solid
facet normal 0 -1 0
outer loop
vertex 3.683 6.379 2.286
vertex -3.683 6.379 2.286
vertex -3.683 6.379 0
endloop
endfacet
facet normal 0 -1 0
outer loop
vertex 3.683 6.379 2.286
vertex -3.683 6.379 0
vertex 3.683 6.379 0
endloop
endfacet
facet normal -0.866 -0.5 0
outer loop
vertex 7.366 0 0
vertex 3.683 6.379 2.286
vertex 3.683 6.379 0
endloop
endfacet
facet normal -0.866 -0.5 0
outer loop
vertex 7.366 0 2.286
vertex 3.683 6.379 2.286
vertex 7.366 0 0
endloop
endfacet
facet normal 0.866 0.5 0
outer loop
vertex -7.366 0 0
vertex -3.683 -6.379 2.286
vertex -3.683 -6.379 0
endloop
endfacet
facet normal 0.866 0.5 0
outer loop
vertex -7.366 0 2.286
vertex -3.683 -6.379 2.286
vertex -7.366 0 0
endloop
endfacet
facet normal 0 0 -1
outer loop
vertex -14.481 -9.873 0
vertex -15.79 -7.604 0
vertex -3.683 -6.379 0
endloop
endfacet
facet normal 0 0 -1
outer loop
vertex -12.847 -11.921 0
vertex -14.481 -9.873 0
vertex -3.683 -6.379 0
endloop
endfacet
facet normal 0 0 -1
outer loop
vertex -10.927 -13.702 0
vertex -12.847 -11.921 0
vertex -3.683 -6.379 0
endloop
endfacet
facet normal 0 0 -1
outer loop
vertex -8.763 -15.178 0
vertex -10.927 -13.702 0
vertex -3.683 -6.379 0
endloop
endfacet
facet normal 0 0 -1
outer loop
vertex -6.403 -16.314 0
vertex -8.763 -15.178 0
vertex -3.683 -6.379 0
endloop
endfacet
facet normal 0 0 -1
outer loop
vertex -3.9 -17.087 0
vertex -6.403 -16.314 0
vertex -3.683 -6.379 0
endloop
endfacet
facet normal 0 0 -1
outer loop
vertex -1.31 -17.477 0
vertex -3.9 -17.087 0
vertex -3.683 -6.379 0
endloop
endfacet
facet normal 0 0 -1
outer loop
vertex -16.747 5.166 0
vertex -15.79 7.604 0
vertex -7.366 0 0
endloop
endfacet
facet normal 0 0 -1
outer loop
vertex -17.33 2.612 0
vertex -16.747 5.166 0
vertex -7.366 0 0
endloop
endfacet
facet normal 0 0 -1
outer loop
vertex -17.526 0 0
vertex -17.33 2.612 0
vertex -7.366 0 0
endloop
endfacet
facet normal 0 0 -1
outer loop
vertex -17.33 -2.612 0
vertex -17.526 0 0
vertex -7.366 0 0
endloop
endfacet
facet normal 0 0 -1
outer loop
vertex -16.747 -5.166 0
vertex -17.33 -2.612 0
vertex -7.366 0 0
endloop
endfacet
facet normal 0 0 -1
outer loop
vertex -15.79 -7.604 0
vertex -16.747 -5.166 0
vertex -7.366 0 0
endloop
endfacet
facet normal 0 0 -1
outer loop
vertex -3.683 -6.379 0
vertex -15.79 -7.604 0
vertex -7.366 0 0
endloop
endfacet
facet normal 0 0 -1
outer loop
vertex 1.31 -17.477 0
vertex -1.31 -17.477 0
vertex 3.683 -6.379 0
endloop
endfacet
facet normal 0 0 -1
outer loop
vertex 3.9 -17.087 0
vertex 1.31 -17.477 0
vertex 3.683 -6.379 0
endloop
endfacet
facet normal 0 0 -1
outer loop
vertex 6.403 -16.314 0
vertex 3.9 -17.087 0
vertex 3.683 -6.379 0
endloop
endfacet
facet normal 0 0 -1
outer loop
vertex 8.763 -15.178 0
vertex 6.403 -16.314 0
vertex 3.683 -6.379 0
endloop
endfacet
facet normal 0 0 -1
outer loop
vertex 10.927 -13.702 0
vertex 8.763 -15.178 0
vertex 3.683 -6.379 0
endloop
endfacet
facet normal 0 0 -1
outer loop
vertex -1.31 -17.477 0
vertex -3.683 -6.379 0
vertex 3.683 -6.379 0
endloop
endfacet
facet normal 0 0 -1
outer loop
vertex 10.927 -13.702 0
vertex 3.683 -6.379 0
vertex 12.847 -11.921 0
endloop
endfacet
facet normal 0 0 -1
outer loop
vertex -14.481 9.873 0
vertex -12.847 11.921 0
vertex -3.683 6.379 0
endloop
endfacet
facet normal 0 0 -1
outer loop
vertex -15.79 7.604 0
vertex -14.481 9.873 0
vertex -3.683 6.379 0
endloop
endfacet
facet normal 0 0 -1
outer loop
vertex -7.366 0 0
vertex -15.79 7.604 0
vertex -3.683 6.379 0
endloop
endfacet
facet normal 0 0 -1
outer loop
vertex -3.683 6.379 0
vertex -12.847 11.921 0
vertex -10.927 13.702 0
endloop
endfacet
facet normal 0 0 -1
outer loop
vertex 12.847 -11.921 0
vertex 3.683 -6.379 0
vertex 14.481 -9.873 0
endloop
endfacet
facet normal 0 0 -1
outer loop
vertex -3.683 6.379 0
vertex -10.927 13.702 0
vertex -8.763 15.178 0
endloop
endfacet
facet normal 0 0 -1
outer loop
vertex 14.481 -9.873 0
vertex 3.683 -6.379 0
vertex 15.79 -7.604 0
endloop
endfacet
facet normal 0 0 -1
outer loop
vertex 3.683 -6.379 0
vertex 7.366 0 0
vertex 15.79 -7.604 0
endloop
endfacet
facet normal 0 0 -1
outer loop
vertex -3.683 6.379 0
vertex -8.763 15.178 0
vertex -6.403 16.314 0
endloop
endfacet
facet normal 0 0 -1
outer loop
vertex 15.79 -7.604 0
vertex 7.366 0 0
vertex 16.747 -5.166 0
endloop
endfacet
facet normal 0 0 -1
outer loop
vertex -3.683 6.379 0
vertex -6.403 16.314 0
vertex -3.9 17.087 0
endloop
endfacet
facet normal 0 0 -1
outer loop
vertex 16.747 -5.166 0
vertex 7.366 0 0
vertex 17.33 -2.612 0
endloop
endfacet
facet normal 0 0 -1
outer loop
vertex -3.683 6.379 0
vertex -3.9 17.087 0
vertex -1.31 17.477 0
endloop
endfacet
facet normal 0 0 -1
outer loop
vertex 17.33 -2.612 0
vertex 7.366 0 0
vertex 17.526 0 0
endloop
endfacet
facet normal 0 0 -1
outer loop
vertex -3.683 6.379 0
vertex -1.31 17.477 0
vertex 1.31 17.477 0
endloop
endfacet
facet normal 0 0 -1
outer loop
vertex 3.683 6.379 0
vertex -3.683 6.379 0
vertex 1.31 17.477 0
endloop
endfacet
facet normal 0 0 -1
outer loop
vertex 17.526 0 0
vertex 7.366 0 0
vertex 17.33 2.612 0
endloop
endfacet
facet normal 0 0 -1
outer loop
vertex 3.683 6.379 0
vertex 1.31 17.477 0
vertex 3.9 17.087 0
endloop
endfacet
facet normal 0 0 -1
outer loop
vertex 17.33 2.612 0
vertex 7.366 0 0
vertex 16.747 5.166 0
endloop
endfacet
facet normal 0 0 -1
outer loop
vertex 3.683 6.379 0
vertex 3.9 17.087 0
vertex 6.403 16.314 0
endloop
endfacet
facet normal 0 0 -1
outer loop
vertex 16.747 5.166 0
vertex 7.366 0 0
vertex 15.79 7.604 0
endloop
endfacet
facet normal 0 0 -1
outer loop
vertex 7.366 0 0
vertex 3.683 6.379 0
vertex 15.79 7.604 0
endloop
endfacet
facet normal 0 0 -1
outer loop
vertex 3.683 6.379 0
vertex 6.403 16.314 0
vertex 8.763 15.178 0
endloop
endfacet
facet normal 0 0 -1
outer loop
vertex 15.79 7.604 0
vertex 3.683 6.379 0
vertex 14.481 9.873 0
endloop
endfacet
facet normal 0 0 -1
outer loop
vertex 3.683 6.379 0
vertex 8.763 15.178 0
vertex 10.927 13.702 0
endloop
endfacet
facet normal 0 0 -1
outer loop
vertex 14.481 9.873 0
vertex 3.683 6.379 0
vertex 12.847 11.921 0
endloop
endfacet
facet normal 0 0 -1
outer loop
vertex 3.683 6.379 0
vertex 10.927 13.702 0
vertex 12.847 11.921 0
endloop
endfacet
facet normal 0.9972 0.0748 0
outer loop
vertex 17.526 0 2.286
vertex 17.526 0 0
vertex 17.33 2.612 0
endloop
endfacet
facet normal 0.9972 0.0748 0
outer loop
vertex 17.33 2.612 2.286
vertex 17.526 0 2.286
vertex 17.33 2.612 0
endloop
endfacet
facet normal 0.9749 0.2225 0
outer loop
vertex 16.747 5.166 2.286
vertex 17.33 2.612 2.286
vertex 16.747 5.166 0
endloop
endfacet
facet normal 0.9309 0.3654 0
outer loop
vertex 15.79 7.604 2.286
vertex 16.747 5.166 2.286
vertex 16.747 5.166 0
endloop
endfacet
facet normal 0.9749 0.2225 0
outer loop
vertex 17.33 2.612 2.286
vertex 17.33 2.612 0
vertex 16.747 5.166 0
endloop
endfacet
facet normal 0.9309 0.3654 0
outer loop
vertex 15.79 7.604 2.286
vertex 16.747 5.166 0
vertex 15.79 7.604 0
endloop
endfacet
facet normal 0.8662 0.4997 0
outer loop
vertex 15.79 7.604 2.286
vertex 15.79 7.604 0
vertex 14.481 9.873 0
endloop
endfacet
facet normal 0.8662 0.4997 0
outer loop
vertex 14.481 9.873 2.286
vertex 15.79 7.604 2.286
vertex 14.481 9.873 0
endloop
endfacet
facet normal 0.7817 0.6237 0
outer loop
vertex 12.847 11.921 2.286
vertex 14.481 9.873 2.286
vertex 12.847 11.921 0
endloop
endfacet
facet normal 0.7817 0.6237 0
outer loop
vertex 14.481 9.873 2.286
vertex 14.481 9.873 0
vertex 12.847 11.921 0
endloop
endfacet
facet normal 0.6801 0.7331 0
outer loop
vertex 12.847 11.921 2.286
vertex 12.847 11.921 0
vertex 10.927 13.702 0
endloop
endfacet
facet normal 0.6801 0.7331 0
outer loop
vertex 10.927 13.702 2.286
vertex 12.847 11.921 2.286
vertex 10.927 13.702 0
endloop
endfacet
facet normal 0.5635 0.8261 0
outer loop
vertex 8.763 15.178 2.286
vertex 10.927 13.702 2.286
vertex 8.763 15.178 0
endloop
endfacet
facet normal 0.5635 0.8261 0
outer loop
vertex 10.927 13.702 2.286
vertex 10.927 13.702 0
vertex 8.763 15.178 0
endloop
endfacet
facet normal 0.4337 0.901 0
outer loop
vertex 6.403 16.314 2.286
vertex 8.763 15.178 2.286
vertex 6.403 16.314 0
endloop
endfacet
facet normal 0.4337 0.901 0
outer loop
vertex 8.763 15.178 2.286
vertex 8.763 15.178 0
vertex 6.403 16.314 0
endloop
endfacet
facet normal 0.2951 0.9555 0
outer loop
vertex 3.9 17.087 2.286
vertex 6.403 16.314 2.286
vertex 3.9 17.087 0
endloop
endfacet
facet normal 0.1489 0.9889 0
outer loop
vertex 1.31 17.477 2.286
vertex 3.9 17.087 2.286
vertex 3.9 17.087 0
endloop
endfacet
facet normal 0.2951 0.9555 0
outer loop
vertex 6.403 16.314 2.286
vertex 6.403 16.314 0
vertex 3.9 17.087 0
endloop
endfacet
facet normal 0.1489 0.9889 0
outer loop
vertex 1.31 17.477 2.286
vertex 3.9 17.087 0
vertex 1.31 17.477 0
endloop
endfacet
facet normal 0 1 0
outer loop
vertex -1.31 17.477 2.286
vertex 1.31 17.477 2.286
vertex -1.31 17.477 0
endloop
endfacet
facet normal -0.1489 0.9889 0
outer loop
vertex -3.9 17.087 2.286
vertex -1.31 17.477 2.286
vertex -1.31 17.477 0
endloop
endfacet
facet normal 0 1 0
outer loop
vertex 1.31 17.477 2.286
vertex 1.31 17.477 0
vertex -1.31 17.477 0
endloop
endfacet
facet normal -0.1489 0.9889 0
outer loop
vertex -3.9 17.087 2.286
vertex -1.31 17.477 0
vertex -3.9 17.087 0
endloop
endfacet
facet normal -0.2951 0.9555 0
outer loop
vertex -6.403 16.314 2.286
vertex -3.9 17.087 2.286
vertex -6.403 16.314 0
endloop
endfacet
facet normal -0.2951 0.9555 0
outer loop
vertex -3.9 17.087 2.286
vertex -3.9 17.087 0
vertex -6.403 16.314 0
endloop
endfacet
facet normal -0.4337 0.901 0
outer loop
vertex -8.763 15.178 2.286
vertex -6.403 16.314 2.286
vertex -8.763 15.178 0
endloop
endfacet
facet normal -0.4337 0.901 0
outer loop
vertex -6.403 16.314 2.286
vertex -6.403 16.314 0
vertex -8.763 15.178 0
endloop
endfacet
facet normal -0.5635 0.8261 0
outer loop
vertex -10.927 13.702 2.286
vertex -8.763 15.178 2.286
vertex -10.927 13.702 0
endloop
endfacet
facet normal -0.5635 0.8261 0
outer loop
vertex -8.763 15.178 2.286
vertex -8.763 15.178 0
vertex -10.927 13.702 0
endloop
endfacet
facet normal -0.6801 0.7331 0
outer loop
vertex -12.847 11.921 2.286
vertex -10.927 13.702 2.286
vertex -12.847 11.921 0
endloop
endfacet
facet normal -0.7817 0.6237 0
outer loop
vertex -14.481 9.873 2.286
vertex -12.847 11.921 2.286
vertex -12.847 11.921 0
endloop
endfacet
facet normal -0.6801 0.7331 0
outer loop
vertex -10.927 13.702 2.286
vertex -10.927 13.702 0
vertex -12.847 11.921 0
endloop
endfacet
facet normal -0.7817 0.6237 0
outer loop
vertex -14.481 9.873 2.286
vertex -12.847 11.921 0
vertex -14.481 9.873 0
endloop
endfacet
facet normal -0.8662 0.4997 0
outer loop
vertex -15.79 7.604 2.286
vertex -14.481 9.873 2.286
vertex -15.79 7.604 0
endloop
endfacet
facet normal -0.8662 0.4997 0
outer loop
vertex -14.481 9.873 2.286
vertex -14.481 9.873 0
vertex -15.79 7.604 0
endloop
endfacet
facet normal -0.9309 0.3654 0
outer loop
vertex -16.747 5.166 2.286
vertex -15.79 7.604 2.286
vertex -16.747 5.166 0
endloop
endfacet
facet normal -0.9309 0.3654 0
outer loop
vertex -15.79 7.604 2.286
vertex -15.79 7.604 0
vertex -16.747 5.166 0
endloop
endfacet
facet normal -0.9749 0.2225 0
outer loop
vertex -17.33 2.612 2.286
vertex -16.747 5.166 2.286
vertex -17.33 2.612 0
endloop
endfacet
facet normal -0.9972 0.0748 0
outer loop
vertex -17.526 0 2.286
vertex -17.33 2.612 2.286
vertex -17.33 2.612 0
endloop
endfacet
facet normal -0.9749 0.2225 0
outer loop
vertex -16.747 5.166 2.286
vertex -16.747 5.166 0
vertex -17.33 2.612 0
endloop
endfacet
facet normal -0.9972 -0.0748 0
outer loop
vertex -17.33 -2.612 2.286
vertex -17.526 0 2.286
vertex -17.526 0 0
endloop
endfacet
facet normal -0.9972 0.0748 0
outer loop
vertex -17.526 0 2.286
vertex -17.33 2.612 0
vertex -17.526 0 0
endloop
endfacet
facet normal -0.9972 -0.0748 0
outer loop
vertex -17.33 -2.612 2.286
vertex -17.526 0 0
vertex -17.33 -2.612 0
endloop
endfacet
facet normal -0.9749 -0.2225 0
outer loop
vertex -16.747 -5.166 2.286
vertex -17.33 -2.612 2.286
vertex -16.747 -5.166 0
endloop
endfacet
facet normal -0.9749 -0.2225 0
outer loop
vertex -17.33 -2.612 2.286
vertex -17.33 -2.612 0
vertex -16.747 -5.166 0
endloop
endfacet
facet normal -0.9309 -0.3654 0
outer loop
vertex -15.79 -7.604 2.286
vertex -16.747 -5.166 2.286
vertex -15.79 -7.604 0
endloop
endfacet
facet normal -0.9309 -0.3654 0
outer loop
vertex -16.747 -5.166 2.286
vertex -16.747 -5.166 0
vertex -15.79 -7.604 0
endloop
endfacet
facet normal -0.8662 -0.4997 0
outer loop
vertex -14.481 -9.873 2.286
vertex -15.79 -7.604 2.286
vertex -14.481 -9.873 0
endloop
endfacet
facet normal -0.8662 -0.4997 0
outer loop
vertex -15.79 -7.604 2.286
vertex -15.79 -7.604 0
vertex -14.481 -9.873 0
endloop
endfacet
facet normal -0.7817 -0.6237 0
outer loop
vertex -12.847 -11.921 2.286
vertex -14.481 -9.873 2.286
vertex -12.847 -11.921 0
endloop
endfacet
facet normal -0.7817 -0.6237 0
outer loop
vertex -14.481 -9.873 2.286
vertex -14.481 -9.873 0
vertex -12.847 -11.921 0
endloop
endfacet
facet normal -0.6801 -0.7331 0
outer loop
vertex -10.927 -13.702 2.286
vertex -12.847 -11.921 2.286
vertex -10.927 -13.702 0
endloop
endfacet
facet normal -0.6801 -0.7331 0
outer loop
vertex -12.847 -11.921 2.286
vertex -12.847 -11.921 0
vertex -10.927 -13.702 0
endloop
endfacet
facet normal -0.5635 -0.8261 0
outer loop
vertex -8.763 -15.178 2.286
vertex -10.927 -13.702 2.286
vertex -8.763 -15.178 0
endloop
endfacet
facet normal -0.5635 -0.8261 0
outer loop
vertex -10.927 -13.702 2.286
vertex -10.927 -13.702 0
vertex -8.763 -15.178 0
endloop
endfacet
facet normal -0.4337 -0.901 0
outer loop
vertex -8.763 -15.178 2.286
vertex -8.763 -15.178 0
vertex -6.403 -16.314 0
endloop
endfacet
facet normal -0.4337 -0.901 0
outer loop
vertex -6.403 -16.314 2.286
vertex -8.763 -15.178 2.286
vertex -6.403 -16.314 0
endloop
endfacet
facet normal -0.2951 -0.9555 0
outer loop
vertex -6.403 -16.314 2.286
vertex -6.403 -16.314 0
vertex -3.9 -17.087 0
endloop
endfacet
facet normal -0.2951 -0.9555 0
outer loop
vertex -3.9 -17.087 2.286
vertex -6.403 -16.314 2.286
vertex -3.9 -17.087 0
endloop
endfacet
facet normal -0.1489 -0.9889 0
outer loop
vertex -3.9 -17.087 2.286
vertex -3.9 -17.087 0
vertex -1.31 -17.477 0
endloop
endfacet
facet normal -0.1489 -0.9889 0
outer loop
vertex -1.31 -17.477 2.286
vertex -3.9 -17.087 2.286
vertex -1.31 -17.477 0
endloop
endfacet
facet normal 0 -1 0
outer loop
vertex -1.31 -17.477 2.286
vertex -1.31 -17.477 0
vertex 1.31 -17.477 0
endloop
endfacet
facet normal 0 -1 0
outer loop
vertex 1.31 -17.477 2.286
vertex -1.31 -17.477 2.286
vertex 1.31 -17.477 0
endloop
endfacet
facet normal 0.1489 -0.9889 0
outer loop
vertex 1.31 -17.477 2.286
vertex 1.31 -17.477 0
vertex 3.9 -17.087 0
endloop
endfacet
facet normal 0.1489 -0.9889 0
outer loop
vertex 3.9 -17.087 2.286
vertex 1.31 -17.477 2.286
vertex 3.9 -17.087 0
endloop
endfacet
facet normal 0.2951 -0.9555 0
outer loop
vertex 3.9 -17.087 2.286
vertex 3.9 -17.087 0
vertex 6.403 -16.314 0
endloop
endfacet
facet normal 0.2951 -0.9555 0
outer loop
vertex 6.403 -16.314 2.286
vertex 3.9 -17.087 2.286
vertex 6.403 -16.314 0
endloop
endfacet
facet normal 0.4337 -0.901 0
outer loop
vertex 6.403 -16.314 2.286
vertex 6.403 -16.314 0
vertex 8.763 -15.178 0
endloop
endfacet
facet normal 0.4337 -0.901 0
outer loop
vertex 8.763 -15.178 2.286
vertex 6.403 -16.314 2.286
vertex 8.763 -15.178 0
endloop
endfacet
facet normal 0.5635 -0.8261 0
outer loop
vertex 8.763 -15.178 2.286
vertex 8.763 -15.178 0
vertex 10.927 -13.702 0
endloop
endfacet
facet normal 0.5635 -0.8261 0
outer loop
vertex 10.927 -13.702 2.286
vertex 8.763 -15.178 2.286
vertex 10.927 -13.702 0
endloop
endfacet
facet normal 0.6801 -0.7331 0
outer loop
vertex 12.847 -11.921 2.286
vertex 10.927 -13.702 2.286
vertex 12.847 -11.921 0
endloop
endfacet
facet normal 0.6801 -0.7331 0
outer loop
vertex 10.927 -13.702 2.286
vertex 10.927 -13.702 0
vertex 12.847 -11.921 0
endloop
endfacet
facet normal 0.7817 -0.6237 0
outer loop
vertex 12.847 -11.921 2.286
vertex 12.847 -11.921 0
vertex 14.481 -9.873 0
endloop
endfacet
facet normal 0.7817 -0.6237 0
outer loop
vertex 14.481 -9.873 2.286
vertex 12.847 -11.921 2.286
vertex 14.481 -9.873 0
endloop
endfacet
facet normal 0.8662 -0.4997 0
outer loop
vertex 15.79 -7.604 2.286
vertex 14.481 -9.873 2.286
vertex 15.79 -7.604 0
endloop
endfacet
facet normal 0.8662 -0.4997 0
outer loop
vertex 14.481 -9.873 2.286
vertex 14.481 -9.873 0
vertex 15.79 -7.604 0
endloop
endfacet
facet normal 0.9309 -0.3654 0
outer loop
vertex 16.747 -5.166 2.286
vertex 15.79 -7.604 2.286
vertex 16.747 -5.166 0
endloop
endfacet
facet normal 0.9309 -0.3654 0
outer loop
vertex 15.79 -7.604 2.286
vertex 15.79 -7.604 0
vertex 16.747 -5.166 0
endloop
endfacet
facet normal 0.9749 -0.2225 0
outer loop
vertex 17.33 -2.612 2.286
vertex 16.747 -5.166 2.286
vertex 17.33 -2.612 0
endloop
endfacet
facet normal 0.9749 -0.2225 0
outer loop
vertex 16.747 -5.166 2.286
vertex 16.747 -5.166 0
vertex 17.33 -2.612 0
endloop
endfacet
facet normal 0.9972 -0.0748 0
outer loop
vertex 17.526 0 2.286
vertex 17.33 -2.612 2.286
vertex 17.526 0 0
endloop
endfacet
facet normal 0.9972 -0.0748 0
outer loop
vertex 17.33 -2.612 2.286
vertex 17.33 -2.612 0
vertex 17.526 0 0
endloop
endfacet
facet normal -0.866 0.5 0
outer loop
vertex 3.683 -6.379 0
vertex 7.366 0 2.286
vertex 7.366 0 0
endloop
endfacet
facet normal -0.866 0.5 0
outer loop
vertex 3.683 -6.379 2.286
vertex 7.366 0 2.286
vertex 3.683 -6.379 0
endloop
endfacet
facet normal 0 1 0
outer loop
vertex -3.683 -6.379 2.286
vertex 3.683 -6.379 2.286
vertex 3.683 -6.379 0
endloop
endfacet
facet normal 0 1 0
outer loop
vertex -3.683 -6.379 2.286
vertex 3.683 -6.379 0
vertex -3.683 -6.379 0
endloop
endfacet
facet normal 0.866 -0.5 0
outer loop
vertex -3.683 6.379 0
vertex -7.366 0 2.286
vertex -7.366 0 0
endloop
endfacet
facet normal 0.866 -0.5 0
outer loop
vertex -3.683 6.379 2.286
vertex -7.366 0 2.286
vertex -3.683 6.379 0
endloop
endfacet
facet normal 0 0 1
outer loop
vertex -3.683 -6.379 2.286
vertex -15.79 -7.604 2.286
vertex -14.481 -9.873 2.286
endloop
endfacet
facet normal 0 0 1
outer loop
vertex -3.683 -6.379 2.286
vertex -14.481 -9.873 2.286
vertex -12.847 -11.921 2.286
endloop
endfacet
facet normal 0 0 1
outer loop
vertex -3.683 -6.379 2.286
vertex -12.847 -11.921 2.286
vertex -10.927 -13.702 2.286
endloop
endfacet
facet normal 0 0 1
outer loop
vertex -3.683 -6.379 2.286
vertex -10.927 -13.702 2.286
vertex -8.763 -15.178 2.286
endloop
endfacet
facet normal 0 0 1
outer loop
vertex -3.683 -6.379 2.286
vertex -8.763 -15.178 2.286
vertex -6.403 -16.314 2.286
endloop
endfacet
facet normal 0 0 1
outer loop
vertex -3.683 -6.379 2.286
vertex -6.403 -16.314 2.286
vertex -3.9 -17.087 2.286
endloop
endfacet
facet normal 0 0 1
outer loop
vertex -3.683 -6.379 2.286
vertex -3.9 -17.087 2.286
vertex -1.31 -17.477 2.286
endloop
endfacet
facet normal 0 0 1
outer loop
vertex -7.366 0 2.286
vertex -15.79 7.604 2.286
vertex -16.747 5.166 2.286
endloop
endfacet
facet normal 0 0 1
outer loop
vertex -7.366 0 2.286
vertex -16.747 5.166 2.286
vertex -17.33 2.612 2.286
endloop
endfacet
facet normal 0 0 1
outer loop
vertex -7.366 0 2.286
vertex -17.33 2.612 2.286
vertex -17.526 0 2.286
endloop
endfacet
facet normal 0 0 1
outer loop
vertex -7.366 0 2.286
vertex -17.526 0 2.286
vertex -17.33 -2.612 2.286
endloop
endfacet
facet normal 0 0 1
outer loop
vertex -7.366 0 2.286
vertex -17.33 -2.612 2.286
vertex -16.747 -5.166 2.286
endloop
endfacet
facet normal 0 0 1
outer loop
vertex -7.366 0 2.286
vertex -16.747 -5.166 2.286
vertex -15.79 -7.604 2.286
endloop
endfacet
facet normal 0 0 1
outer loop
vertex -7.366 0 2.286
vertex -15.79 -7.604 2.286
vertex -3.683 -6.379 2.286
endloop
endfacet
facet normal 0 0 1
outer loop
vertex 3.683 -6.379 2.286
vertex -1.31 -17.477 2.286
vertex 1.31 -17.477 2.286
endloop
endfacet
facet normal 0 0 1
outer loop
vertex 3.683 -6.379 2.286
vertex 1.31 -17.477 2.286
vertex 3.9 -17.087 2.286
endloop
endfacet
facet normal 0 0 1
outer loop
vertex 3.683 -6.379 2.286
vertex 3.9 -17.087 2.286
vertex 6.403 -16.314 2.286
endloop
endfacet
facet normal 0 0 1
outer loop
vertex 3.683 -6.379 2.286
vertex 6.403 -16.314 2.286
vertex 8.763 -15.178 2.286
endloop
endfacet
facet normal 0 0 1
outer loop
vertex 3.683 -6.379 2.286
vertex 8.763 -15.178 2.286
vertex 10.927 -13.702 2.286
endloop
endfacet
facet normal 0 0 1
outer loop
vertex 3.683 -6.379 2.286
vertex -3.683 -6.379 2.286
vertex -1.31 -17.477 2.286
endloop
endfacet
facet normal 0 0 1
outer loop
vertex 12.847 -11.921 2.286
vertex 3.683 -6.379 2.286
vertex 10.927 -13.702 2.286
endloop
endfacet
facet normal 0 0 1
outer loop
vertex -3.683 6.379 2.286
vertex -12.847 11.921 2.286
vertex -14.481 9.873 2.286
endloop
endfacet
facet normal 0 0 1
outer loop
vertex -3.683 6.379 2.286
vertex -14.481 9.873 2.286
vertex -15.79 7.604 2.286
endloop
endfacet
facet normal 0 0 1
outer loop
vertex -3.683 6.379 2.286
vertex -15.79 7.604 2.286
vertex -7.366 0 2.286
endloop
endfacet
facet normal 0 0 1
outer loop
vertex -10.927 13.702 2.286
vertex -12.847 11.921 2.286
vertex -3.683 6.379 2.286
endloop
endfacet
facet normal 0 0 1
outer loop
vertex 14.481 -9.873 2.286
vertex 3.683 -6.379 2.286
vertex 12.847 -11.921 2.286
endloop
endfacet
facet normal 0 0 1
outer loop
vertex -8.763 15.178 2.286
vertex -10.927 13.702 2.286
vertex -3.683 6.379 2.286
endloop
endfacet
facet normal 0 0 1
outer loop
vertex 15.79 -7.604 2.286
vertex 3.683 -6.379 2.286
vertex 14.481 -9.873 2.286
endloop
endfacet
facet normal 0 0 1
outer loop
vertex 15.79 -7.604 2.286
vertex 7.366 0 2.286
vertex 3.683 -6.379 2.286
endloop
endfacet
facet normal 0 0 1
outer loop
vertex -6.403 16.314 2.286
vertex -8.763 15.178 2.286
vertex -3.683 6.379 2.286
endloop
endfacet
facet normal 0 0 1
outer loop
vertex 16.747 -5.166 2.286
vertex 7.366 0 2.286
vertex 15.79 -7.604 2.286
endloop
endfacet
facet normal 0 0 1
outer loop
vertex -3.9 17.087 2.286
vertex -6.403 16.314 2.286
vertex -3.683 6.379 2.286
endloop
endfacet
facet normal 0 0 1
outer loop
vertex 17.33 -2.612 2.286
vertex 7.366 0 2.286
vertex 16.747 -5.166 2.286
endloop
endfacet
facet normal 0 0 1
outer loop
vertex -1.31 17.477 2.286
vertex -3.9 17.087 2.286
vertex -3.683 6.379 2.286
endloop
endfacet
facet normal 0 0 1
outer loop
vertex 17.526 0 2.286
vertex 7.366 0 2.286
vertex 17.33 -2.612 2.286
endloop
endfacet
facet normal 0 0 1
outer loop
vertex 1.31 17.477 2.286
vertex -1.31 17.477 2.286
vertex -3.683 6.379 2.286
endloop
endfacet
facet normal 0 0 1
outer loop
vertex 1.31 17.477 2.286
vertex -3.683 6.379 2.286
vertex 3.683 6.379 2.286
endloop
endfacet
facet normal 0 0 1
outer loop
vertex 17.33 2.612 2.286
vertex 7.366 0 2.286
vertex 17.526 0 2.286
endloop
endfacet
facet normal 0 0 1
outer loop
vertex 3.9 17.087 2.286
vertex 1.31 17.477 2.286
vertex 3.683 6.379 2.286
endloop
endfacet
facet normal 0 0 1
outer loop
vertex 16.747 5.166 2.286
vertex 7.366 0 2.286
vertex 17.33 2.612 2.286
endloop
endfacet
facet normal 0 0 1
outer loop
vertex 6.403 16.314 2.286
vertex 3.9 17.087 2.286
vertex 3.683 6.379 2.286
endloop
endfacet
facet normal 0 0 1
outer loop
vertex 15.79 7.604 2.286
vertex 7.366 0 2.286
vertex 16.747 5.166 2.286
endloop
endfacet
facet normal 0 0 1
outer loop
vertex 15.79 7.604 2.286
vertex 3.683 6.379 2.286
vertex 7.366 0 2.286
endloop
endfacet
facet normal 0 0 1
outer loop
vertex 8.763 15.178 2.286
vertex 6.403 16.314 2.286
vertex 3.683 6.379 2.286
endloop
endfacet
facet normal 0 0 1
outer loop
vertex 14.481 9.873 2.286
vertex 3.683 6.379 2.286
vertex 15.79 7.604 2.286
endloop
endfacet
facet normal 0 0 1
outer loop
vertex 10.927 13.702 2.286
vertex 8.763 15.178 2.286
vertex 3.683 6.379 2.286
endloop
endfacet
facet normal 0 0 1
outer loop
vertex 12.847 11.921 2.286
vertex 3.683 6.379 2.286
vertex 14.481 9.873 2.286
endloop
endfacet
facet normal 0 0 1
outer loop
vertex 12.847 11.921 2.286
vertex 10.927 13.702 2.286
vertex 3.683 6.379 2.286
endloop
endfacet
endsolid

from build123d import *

# Parameters (mm, degrees)
SKETCH1_R               = 17.526
BOSS_EXTRUDE1_DEPTH     = 2.286
CUT_EXTRUDE1_DEPTH      = 25.890704048
CUT_EXTRUDE1_DEPTH_BACK = 25.890704048


with BuildPart() as part:
    # Sketch1 → Boss-Extrude1 (new body)
    with BuildSketch(Plane.XY):
        Circle(SKETCH1_R)
    extrude(amount=BOSS_EXTRUDE1_DEPTH)

    # Sketch2 → Cut-Extrude1 (cut, two sides: drawn at the far end of the back side and taken through both)
    with BuildSketch(Plane(origin=(0, 0, 0), x_dir=(-1, 0, 0), z_dir=(0, 0, -1)).offset(-CUT_EXTRUDE1_DEPTH_BACK)):
        Polygon((3.683, 6.379143124), (-3.683, 6.379143124), (-7.366, 0), (-3.683, -6.379143124), (3.683, -6.379143124), (7.366, 0), align=None)
    extrude(amount=CUT_EXTRUDE1_DEPTH + CUT_EXTRUDE1_DEPTH_BACK, mode=Mode.SUBTRACT)


solid = part.part
